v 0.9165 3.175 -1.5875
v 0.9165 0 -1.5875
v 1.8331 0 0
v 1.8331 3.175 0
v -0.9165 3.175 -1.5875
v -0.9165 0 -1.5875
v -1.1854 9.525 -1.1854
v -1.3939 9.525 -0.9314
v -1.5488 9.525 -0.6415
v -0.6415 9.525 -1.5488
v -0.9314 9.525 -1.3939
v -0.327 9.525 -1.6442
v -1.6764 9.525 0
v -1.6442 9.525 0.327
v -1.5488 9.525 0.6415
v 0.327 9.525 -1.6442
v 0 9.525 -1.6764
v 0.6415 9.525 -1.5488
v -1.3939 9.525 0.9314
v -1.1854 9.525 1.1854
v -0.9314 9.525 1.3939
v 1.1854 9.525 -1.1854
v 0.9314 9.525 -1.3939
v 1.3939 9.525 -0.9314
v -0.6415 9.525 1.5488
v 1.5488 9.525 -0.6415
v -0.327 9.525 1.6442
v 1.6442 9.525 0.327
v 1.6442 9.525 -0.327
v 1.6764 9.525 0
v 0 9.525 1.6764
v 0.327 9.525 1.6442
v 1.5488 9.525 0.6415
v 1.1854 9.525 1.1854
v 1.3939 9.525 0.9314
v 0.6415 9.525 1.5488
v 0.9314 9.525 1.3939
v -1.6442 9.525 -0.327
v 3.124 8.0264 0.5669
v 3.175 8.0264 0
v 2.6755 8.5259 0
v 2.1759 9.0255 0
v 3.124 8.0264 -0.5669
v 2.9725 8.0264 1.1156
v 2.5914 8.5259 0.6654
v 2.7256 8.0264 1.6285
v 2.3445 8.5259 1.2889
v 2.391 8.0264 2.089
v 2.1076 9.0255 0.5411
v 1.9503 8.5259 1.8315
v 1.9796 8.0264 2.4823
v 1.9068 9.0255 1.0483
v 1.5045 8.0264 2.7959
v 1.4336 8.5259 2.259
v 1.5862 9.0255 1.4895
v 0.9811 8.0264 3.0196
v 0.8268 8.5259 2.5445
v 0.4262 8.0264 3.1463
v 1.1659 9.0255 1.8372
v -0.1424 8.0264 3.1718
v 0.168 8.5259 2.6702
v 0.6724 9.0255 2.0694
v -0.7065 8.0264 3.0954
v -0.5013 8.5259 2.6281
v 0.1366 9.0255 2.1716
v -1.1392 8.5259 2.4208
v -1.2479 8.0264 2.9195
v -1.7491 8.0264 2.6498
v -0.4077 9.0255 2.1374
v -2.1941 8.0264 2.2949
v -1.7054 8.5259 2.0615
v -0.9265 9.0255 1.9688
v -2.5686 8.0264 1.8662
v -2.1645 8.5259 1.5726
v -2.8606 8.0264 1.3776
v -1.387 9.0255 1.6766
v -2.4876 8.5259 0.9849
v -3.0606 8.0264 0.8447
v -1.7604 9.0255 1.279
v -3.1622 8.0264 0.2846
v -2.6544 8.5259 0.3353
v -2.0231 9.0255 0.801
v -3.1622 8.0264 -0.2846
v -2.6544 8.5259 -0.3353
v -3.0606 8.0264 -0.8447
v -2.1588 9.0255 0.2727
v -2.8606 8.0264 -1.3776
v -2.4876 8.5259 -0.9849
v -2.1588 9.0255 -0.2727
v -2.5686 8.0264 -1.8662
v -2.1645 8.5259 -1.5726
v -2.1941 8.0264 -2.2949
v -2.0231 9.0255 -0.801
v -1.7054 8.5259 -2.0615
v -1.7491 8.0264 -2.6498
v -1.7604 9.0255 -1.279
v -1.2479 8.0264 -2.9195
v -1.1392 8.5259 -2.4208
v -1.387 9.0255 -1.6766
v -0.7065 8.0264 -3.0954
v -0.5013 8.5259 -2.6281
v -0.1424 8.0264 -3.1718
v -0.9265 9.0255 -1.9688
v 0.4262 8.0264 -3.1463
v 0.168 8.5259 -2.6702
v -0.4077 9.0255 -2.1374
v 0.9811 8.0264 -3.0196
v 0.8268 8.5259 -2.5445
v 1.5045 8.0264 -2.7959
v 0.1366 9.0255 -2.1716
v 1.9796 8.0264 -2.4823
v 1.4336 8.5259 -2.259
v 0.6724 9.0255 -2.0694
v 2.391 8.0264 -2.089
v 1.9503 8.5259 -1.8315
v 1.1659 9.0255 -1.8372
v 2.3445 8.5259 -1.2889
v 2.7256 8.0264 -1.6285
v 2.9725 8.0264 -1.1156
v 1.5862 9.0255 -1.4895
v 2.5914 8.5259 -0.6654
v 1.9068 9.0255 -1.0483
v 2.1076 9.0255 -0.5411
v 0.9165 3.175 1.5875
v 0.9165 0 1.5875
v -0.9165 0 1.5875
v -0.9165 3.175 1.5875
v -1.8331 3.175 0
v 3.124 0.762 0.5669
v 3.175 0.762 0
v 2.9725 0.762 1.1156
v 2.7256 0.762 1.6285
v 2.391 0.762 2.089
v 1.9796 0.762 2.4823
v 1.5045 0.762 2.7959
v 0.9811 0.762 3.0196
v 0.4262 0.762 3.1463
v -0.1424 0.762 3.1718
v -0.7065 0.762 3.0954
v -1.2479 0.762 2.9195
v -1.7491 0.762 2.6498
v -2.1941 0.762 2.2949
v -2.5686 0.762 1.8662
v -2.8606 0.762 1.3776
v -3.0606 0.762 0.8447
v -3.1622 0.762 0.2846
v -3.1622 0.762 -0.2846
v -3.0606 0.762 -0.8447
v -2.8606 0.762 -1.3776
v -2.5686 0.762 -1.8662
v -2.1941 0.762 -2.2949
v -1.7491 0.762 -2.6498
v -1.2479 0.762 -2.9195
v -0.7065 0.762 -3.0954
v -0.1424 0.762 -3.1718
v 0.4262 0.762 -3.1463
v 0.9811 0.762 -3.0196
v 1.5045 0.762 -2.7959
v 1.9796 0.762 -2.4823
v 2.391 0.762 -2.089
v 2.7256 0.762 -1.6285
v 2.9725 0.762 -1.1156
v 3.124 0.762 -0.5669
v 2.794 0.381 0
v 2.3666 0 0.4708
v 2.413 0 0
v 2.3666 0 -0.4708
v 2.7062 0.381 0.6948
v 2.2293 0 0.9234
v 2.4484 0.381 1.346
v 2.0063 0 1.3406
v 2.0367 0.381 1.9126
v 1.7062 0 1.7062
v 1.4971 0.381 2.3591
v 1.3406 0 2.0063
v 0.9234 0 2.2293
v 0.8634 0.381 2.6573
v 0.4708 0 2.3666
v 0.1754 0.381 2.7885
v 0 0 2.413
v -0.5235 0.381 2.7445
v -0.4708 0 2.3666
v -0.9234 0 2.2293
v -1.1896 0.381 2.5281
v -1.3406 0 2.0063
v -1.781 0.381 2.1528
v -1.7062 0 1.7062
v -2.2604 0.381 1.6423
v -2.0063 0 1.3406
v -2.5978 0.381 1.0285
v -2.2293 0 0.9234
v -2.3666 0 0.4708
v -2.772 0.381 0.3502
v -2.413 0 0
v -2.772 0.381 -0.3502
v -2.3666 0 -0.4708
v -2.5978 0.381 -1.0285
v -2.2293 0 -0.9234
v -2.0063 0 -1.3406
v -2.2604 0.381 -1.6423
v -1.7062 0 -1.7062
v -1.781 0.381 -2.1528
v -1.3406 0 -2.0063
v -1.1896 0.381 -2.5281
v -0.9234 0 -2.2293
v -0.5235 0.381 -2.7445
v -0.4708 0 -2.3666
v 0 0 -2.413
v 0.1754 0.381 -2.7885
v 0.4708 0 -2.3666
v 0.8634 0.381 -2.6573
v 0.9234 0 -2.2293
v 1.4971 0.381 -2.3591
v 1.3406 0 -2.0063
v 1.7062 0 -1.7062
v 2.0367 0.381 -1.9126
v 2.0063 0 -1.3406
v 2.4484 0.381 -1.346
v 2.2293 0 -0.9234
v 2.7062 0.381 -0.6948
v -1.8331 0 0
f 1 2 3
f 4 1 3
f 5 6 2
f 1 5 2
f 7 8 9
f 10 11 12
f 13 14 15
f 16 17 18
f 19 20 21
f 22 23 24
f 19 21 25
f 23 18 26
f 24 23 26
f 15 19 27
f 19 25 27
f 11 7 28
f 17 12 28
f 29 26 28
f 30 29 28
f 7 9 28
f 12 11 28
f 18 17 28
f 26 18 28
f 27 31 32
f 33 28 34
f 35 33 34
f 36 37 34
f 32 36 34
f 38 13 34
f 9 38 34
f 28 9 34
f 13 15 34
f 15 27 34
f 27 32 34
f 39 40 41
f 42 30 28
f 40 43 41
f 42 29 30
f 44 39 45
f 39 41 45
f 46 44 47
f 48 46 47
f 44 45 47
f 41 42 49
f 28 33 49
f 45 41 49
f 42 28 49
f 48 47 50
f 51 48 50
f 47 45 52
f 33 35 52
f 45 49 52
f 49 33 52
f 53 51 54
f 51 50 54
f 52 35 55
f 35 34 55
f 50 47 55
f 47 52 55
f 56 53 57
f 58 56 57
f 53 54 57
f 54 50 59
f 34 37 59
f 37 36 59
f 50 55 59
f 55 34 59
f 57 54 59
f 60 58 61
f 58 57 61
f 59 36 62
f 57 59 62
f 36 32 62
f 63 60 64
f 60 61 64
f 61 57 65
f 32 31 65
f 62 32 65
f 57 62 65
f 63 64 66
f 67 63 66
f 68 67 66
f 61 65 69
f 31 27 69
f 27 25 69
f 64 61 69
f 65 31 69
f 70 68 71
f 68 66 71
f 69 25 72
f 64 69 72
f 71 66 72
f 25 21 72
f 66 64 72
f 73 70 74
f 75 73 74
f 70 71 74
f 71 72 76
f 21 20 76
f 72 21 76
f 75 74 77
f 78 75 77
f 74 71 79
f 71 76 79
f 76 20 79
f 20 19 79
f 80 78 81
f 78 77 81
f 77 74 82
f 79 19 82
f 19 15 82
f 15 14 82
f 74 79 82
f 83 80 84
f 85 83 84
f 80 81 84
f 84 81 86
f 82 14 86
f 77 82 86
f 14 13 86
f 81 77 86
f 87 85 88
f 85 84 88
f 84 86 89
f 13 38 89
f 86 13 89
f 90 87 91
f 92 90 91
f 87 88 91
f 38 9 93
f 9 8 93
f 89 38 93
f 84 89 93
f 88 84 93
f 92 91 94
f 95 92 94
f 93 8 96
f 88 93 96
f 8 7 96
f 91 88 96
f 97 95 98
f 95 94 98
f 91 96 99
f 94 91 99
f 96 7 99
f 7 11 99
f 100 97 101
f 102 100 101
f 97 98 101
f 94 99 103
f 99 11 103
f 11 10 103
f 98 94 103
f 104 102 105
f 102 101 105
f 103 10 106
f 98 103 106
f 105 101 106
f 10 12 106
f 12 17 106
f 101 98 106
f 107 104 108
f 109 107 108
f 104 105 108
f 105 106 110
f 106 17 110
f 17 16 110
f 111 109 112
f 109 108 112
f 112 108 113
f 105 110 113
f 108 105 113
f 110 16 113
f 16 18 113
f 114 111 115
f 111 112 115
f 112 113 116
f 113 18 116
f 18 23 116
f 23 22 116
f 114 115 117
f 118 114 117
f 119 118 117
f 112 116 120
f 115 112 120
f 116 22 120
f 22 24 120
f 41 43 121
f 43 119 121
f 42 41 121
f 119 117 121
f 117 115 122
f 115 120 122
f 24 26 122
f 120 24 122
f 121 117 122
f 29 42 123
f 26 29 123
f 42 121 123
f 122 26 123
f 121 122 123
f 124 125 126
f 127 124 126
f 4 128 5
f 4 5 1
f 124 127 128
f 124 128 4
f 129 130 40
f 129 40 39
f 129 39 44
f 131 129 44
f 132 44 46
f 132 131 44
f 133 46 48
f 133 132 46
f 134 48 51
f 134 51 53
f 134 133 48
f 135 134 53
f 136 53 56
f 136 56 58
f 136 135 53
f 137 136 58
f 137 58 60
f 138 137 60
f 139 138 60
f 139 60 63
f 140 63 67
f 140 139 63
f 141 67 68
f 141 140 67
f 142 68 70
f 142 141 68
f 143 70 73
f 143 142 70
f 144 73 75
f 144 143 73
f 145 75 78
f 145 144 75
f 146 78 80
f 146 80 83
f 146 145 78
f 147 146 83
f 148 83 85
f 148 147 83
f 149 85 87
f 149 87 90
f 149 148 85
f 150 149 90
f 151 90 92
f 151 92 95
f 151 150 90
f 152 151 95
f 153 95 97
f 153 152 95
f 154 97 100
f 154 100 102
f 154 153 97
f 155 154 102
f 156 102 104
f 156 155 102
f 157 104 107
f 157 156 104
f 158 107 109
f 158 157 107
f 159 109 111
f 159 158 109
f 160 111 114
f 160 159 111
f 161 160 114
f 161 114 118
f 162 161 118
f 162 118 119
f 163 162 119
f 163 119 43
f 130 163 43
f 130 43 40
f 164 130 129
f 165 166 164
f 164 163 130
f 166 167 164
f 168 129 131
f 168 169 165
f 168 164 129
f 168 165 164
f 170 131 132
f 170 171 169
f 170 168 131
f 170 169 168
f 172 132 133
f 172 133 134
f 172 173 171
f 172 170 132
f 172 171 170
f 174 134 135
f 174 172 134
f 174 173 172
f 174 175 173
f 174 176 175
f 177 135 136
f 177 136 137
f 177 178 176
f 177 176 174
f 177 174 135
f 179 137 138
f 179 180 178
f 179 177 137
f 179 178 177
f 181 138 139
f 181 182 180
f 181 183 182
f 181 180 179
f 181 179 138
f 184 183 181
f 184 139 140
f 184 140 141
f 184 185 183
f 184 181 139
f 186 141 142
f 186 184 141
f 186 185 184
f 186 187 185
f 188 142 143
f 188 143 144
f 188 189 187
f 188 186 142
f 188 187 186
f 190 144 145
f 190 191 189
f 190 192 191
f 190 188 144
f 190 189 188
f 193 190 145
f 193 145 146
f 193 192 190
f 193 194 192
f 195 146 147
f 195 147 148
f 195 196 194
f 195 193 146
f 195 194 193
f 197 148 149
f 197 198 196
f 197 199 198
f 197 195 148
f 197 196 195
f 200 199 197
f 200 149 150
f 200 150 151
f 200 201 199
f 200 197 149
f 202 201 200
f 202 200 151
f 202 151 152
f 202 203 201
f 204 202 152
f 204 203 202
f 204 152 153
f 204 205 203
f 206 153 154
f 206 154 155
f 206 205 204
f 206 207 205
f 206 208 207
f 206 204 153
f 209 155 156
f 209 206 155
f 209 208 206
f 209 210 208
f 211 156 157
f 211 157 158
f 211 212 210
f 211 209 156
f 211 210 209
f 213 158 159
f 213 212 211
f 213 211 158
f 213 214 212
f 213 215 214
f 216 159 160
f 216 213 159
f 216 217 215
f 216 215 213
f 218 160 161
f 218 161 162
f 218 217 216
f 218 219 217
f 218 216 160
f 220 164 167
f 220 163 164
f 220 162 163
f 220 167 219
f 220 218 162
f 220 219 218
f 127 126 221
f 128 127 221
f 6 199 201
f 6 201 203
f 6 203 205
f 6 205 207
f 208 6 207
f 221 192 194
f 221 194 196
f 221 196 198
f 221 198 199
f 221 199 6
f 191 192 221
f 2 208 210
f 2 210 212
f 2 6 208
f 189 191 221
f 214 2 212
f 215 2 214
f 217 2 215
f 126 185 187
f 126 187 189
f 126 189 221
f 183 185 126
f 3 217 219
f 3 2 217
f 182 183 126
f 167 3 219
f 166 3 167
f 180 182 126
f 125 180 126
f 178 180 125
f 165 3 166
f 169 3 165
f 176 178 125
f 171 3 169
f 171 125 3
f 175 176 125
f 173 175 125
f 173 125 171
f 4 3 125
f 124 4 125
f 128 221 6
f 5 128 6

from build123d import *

# Parameters (mm, degrees)
F0_R     = 3.175
F1_DEPTH = 9.525
F2_SIZE2 = 1.4986
F2_SIZE  = 1.4986
F3_SIZE2 = 0.762
F3_SIZE  = 0.762
F5_DEPTH = 3.175


with BuildPart() as f1:
    # F0 (on Front) → F1 (new body)
    with BuildSketch(Plane.XZ):
        Circle(F0_R)
    extrude(amount=-F1_DEPTH)

    # F2
    f2_edges = [f1.edges().sort_by_distance(p)[0] for p in [
        (-3.175, 9.525, 0),
    ]]
    chamfer(f2_edges, length=F2_SIZE, length2=F2_SIZE2)

    # F3
    f3_edges = [f1.edges().sort_by_distance(p)[0] for p in [
        (-3.175, 0, 0),
    ]]
    chamfer(f3_edges, length=F3_SIZE, length2=F3_SIZE2)

    # F4 (on face) → F5 (cut)
    with BuildSketch(Plane.XZ):
        Polygon((0.916544, 1.5875), (-0.916544, 1.5875), (-1.833087, 0), (-0.916544, -1.5875), (0.916544, -1.5875), (1.833087, 0), align=None)
    extrude(amount=-F5_DEPTH, mode=Mode.SUBTRACT)


solid = f1.part
